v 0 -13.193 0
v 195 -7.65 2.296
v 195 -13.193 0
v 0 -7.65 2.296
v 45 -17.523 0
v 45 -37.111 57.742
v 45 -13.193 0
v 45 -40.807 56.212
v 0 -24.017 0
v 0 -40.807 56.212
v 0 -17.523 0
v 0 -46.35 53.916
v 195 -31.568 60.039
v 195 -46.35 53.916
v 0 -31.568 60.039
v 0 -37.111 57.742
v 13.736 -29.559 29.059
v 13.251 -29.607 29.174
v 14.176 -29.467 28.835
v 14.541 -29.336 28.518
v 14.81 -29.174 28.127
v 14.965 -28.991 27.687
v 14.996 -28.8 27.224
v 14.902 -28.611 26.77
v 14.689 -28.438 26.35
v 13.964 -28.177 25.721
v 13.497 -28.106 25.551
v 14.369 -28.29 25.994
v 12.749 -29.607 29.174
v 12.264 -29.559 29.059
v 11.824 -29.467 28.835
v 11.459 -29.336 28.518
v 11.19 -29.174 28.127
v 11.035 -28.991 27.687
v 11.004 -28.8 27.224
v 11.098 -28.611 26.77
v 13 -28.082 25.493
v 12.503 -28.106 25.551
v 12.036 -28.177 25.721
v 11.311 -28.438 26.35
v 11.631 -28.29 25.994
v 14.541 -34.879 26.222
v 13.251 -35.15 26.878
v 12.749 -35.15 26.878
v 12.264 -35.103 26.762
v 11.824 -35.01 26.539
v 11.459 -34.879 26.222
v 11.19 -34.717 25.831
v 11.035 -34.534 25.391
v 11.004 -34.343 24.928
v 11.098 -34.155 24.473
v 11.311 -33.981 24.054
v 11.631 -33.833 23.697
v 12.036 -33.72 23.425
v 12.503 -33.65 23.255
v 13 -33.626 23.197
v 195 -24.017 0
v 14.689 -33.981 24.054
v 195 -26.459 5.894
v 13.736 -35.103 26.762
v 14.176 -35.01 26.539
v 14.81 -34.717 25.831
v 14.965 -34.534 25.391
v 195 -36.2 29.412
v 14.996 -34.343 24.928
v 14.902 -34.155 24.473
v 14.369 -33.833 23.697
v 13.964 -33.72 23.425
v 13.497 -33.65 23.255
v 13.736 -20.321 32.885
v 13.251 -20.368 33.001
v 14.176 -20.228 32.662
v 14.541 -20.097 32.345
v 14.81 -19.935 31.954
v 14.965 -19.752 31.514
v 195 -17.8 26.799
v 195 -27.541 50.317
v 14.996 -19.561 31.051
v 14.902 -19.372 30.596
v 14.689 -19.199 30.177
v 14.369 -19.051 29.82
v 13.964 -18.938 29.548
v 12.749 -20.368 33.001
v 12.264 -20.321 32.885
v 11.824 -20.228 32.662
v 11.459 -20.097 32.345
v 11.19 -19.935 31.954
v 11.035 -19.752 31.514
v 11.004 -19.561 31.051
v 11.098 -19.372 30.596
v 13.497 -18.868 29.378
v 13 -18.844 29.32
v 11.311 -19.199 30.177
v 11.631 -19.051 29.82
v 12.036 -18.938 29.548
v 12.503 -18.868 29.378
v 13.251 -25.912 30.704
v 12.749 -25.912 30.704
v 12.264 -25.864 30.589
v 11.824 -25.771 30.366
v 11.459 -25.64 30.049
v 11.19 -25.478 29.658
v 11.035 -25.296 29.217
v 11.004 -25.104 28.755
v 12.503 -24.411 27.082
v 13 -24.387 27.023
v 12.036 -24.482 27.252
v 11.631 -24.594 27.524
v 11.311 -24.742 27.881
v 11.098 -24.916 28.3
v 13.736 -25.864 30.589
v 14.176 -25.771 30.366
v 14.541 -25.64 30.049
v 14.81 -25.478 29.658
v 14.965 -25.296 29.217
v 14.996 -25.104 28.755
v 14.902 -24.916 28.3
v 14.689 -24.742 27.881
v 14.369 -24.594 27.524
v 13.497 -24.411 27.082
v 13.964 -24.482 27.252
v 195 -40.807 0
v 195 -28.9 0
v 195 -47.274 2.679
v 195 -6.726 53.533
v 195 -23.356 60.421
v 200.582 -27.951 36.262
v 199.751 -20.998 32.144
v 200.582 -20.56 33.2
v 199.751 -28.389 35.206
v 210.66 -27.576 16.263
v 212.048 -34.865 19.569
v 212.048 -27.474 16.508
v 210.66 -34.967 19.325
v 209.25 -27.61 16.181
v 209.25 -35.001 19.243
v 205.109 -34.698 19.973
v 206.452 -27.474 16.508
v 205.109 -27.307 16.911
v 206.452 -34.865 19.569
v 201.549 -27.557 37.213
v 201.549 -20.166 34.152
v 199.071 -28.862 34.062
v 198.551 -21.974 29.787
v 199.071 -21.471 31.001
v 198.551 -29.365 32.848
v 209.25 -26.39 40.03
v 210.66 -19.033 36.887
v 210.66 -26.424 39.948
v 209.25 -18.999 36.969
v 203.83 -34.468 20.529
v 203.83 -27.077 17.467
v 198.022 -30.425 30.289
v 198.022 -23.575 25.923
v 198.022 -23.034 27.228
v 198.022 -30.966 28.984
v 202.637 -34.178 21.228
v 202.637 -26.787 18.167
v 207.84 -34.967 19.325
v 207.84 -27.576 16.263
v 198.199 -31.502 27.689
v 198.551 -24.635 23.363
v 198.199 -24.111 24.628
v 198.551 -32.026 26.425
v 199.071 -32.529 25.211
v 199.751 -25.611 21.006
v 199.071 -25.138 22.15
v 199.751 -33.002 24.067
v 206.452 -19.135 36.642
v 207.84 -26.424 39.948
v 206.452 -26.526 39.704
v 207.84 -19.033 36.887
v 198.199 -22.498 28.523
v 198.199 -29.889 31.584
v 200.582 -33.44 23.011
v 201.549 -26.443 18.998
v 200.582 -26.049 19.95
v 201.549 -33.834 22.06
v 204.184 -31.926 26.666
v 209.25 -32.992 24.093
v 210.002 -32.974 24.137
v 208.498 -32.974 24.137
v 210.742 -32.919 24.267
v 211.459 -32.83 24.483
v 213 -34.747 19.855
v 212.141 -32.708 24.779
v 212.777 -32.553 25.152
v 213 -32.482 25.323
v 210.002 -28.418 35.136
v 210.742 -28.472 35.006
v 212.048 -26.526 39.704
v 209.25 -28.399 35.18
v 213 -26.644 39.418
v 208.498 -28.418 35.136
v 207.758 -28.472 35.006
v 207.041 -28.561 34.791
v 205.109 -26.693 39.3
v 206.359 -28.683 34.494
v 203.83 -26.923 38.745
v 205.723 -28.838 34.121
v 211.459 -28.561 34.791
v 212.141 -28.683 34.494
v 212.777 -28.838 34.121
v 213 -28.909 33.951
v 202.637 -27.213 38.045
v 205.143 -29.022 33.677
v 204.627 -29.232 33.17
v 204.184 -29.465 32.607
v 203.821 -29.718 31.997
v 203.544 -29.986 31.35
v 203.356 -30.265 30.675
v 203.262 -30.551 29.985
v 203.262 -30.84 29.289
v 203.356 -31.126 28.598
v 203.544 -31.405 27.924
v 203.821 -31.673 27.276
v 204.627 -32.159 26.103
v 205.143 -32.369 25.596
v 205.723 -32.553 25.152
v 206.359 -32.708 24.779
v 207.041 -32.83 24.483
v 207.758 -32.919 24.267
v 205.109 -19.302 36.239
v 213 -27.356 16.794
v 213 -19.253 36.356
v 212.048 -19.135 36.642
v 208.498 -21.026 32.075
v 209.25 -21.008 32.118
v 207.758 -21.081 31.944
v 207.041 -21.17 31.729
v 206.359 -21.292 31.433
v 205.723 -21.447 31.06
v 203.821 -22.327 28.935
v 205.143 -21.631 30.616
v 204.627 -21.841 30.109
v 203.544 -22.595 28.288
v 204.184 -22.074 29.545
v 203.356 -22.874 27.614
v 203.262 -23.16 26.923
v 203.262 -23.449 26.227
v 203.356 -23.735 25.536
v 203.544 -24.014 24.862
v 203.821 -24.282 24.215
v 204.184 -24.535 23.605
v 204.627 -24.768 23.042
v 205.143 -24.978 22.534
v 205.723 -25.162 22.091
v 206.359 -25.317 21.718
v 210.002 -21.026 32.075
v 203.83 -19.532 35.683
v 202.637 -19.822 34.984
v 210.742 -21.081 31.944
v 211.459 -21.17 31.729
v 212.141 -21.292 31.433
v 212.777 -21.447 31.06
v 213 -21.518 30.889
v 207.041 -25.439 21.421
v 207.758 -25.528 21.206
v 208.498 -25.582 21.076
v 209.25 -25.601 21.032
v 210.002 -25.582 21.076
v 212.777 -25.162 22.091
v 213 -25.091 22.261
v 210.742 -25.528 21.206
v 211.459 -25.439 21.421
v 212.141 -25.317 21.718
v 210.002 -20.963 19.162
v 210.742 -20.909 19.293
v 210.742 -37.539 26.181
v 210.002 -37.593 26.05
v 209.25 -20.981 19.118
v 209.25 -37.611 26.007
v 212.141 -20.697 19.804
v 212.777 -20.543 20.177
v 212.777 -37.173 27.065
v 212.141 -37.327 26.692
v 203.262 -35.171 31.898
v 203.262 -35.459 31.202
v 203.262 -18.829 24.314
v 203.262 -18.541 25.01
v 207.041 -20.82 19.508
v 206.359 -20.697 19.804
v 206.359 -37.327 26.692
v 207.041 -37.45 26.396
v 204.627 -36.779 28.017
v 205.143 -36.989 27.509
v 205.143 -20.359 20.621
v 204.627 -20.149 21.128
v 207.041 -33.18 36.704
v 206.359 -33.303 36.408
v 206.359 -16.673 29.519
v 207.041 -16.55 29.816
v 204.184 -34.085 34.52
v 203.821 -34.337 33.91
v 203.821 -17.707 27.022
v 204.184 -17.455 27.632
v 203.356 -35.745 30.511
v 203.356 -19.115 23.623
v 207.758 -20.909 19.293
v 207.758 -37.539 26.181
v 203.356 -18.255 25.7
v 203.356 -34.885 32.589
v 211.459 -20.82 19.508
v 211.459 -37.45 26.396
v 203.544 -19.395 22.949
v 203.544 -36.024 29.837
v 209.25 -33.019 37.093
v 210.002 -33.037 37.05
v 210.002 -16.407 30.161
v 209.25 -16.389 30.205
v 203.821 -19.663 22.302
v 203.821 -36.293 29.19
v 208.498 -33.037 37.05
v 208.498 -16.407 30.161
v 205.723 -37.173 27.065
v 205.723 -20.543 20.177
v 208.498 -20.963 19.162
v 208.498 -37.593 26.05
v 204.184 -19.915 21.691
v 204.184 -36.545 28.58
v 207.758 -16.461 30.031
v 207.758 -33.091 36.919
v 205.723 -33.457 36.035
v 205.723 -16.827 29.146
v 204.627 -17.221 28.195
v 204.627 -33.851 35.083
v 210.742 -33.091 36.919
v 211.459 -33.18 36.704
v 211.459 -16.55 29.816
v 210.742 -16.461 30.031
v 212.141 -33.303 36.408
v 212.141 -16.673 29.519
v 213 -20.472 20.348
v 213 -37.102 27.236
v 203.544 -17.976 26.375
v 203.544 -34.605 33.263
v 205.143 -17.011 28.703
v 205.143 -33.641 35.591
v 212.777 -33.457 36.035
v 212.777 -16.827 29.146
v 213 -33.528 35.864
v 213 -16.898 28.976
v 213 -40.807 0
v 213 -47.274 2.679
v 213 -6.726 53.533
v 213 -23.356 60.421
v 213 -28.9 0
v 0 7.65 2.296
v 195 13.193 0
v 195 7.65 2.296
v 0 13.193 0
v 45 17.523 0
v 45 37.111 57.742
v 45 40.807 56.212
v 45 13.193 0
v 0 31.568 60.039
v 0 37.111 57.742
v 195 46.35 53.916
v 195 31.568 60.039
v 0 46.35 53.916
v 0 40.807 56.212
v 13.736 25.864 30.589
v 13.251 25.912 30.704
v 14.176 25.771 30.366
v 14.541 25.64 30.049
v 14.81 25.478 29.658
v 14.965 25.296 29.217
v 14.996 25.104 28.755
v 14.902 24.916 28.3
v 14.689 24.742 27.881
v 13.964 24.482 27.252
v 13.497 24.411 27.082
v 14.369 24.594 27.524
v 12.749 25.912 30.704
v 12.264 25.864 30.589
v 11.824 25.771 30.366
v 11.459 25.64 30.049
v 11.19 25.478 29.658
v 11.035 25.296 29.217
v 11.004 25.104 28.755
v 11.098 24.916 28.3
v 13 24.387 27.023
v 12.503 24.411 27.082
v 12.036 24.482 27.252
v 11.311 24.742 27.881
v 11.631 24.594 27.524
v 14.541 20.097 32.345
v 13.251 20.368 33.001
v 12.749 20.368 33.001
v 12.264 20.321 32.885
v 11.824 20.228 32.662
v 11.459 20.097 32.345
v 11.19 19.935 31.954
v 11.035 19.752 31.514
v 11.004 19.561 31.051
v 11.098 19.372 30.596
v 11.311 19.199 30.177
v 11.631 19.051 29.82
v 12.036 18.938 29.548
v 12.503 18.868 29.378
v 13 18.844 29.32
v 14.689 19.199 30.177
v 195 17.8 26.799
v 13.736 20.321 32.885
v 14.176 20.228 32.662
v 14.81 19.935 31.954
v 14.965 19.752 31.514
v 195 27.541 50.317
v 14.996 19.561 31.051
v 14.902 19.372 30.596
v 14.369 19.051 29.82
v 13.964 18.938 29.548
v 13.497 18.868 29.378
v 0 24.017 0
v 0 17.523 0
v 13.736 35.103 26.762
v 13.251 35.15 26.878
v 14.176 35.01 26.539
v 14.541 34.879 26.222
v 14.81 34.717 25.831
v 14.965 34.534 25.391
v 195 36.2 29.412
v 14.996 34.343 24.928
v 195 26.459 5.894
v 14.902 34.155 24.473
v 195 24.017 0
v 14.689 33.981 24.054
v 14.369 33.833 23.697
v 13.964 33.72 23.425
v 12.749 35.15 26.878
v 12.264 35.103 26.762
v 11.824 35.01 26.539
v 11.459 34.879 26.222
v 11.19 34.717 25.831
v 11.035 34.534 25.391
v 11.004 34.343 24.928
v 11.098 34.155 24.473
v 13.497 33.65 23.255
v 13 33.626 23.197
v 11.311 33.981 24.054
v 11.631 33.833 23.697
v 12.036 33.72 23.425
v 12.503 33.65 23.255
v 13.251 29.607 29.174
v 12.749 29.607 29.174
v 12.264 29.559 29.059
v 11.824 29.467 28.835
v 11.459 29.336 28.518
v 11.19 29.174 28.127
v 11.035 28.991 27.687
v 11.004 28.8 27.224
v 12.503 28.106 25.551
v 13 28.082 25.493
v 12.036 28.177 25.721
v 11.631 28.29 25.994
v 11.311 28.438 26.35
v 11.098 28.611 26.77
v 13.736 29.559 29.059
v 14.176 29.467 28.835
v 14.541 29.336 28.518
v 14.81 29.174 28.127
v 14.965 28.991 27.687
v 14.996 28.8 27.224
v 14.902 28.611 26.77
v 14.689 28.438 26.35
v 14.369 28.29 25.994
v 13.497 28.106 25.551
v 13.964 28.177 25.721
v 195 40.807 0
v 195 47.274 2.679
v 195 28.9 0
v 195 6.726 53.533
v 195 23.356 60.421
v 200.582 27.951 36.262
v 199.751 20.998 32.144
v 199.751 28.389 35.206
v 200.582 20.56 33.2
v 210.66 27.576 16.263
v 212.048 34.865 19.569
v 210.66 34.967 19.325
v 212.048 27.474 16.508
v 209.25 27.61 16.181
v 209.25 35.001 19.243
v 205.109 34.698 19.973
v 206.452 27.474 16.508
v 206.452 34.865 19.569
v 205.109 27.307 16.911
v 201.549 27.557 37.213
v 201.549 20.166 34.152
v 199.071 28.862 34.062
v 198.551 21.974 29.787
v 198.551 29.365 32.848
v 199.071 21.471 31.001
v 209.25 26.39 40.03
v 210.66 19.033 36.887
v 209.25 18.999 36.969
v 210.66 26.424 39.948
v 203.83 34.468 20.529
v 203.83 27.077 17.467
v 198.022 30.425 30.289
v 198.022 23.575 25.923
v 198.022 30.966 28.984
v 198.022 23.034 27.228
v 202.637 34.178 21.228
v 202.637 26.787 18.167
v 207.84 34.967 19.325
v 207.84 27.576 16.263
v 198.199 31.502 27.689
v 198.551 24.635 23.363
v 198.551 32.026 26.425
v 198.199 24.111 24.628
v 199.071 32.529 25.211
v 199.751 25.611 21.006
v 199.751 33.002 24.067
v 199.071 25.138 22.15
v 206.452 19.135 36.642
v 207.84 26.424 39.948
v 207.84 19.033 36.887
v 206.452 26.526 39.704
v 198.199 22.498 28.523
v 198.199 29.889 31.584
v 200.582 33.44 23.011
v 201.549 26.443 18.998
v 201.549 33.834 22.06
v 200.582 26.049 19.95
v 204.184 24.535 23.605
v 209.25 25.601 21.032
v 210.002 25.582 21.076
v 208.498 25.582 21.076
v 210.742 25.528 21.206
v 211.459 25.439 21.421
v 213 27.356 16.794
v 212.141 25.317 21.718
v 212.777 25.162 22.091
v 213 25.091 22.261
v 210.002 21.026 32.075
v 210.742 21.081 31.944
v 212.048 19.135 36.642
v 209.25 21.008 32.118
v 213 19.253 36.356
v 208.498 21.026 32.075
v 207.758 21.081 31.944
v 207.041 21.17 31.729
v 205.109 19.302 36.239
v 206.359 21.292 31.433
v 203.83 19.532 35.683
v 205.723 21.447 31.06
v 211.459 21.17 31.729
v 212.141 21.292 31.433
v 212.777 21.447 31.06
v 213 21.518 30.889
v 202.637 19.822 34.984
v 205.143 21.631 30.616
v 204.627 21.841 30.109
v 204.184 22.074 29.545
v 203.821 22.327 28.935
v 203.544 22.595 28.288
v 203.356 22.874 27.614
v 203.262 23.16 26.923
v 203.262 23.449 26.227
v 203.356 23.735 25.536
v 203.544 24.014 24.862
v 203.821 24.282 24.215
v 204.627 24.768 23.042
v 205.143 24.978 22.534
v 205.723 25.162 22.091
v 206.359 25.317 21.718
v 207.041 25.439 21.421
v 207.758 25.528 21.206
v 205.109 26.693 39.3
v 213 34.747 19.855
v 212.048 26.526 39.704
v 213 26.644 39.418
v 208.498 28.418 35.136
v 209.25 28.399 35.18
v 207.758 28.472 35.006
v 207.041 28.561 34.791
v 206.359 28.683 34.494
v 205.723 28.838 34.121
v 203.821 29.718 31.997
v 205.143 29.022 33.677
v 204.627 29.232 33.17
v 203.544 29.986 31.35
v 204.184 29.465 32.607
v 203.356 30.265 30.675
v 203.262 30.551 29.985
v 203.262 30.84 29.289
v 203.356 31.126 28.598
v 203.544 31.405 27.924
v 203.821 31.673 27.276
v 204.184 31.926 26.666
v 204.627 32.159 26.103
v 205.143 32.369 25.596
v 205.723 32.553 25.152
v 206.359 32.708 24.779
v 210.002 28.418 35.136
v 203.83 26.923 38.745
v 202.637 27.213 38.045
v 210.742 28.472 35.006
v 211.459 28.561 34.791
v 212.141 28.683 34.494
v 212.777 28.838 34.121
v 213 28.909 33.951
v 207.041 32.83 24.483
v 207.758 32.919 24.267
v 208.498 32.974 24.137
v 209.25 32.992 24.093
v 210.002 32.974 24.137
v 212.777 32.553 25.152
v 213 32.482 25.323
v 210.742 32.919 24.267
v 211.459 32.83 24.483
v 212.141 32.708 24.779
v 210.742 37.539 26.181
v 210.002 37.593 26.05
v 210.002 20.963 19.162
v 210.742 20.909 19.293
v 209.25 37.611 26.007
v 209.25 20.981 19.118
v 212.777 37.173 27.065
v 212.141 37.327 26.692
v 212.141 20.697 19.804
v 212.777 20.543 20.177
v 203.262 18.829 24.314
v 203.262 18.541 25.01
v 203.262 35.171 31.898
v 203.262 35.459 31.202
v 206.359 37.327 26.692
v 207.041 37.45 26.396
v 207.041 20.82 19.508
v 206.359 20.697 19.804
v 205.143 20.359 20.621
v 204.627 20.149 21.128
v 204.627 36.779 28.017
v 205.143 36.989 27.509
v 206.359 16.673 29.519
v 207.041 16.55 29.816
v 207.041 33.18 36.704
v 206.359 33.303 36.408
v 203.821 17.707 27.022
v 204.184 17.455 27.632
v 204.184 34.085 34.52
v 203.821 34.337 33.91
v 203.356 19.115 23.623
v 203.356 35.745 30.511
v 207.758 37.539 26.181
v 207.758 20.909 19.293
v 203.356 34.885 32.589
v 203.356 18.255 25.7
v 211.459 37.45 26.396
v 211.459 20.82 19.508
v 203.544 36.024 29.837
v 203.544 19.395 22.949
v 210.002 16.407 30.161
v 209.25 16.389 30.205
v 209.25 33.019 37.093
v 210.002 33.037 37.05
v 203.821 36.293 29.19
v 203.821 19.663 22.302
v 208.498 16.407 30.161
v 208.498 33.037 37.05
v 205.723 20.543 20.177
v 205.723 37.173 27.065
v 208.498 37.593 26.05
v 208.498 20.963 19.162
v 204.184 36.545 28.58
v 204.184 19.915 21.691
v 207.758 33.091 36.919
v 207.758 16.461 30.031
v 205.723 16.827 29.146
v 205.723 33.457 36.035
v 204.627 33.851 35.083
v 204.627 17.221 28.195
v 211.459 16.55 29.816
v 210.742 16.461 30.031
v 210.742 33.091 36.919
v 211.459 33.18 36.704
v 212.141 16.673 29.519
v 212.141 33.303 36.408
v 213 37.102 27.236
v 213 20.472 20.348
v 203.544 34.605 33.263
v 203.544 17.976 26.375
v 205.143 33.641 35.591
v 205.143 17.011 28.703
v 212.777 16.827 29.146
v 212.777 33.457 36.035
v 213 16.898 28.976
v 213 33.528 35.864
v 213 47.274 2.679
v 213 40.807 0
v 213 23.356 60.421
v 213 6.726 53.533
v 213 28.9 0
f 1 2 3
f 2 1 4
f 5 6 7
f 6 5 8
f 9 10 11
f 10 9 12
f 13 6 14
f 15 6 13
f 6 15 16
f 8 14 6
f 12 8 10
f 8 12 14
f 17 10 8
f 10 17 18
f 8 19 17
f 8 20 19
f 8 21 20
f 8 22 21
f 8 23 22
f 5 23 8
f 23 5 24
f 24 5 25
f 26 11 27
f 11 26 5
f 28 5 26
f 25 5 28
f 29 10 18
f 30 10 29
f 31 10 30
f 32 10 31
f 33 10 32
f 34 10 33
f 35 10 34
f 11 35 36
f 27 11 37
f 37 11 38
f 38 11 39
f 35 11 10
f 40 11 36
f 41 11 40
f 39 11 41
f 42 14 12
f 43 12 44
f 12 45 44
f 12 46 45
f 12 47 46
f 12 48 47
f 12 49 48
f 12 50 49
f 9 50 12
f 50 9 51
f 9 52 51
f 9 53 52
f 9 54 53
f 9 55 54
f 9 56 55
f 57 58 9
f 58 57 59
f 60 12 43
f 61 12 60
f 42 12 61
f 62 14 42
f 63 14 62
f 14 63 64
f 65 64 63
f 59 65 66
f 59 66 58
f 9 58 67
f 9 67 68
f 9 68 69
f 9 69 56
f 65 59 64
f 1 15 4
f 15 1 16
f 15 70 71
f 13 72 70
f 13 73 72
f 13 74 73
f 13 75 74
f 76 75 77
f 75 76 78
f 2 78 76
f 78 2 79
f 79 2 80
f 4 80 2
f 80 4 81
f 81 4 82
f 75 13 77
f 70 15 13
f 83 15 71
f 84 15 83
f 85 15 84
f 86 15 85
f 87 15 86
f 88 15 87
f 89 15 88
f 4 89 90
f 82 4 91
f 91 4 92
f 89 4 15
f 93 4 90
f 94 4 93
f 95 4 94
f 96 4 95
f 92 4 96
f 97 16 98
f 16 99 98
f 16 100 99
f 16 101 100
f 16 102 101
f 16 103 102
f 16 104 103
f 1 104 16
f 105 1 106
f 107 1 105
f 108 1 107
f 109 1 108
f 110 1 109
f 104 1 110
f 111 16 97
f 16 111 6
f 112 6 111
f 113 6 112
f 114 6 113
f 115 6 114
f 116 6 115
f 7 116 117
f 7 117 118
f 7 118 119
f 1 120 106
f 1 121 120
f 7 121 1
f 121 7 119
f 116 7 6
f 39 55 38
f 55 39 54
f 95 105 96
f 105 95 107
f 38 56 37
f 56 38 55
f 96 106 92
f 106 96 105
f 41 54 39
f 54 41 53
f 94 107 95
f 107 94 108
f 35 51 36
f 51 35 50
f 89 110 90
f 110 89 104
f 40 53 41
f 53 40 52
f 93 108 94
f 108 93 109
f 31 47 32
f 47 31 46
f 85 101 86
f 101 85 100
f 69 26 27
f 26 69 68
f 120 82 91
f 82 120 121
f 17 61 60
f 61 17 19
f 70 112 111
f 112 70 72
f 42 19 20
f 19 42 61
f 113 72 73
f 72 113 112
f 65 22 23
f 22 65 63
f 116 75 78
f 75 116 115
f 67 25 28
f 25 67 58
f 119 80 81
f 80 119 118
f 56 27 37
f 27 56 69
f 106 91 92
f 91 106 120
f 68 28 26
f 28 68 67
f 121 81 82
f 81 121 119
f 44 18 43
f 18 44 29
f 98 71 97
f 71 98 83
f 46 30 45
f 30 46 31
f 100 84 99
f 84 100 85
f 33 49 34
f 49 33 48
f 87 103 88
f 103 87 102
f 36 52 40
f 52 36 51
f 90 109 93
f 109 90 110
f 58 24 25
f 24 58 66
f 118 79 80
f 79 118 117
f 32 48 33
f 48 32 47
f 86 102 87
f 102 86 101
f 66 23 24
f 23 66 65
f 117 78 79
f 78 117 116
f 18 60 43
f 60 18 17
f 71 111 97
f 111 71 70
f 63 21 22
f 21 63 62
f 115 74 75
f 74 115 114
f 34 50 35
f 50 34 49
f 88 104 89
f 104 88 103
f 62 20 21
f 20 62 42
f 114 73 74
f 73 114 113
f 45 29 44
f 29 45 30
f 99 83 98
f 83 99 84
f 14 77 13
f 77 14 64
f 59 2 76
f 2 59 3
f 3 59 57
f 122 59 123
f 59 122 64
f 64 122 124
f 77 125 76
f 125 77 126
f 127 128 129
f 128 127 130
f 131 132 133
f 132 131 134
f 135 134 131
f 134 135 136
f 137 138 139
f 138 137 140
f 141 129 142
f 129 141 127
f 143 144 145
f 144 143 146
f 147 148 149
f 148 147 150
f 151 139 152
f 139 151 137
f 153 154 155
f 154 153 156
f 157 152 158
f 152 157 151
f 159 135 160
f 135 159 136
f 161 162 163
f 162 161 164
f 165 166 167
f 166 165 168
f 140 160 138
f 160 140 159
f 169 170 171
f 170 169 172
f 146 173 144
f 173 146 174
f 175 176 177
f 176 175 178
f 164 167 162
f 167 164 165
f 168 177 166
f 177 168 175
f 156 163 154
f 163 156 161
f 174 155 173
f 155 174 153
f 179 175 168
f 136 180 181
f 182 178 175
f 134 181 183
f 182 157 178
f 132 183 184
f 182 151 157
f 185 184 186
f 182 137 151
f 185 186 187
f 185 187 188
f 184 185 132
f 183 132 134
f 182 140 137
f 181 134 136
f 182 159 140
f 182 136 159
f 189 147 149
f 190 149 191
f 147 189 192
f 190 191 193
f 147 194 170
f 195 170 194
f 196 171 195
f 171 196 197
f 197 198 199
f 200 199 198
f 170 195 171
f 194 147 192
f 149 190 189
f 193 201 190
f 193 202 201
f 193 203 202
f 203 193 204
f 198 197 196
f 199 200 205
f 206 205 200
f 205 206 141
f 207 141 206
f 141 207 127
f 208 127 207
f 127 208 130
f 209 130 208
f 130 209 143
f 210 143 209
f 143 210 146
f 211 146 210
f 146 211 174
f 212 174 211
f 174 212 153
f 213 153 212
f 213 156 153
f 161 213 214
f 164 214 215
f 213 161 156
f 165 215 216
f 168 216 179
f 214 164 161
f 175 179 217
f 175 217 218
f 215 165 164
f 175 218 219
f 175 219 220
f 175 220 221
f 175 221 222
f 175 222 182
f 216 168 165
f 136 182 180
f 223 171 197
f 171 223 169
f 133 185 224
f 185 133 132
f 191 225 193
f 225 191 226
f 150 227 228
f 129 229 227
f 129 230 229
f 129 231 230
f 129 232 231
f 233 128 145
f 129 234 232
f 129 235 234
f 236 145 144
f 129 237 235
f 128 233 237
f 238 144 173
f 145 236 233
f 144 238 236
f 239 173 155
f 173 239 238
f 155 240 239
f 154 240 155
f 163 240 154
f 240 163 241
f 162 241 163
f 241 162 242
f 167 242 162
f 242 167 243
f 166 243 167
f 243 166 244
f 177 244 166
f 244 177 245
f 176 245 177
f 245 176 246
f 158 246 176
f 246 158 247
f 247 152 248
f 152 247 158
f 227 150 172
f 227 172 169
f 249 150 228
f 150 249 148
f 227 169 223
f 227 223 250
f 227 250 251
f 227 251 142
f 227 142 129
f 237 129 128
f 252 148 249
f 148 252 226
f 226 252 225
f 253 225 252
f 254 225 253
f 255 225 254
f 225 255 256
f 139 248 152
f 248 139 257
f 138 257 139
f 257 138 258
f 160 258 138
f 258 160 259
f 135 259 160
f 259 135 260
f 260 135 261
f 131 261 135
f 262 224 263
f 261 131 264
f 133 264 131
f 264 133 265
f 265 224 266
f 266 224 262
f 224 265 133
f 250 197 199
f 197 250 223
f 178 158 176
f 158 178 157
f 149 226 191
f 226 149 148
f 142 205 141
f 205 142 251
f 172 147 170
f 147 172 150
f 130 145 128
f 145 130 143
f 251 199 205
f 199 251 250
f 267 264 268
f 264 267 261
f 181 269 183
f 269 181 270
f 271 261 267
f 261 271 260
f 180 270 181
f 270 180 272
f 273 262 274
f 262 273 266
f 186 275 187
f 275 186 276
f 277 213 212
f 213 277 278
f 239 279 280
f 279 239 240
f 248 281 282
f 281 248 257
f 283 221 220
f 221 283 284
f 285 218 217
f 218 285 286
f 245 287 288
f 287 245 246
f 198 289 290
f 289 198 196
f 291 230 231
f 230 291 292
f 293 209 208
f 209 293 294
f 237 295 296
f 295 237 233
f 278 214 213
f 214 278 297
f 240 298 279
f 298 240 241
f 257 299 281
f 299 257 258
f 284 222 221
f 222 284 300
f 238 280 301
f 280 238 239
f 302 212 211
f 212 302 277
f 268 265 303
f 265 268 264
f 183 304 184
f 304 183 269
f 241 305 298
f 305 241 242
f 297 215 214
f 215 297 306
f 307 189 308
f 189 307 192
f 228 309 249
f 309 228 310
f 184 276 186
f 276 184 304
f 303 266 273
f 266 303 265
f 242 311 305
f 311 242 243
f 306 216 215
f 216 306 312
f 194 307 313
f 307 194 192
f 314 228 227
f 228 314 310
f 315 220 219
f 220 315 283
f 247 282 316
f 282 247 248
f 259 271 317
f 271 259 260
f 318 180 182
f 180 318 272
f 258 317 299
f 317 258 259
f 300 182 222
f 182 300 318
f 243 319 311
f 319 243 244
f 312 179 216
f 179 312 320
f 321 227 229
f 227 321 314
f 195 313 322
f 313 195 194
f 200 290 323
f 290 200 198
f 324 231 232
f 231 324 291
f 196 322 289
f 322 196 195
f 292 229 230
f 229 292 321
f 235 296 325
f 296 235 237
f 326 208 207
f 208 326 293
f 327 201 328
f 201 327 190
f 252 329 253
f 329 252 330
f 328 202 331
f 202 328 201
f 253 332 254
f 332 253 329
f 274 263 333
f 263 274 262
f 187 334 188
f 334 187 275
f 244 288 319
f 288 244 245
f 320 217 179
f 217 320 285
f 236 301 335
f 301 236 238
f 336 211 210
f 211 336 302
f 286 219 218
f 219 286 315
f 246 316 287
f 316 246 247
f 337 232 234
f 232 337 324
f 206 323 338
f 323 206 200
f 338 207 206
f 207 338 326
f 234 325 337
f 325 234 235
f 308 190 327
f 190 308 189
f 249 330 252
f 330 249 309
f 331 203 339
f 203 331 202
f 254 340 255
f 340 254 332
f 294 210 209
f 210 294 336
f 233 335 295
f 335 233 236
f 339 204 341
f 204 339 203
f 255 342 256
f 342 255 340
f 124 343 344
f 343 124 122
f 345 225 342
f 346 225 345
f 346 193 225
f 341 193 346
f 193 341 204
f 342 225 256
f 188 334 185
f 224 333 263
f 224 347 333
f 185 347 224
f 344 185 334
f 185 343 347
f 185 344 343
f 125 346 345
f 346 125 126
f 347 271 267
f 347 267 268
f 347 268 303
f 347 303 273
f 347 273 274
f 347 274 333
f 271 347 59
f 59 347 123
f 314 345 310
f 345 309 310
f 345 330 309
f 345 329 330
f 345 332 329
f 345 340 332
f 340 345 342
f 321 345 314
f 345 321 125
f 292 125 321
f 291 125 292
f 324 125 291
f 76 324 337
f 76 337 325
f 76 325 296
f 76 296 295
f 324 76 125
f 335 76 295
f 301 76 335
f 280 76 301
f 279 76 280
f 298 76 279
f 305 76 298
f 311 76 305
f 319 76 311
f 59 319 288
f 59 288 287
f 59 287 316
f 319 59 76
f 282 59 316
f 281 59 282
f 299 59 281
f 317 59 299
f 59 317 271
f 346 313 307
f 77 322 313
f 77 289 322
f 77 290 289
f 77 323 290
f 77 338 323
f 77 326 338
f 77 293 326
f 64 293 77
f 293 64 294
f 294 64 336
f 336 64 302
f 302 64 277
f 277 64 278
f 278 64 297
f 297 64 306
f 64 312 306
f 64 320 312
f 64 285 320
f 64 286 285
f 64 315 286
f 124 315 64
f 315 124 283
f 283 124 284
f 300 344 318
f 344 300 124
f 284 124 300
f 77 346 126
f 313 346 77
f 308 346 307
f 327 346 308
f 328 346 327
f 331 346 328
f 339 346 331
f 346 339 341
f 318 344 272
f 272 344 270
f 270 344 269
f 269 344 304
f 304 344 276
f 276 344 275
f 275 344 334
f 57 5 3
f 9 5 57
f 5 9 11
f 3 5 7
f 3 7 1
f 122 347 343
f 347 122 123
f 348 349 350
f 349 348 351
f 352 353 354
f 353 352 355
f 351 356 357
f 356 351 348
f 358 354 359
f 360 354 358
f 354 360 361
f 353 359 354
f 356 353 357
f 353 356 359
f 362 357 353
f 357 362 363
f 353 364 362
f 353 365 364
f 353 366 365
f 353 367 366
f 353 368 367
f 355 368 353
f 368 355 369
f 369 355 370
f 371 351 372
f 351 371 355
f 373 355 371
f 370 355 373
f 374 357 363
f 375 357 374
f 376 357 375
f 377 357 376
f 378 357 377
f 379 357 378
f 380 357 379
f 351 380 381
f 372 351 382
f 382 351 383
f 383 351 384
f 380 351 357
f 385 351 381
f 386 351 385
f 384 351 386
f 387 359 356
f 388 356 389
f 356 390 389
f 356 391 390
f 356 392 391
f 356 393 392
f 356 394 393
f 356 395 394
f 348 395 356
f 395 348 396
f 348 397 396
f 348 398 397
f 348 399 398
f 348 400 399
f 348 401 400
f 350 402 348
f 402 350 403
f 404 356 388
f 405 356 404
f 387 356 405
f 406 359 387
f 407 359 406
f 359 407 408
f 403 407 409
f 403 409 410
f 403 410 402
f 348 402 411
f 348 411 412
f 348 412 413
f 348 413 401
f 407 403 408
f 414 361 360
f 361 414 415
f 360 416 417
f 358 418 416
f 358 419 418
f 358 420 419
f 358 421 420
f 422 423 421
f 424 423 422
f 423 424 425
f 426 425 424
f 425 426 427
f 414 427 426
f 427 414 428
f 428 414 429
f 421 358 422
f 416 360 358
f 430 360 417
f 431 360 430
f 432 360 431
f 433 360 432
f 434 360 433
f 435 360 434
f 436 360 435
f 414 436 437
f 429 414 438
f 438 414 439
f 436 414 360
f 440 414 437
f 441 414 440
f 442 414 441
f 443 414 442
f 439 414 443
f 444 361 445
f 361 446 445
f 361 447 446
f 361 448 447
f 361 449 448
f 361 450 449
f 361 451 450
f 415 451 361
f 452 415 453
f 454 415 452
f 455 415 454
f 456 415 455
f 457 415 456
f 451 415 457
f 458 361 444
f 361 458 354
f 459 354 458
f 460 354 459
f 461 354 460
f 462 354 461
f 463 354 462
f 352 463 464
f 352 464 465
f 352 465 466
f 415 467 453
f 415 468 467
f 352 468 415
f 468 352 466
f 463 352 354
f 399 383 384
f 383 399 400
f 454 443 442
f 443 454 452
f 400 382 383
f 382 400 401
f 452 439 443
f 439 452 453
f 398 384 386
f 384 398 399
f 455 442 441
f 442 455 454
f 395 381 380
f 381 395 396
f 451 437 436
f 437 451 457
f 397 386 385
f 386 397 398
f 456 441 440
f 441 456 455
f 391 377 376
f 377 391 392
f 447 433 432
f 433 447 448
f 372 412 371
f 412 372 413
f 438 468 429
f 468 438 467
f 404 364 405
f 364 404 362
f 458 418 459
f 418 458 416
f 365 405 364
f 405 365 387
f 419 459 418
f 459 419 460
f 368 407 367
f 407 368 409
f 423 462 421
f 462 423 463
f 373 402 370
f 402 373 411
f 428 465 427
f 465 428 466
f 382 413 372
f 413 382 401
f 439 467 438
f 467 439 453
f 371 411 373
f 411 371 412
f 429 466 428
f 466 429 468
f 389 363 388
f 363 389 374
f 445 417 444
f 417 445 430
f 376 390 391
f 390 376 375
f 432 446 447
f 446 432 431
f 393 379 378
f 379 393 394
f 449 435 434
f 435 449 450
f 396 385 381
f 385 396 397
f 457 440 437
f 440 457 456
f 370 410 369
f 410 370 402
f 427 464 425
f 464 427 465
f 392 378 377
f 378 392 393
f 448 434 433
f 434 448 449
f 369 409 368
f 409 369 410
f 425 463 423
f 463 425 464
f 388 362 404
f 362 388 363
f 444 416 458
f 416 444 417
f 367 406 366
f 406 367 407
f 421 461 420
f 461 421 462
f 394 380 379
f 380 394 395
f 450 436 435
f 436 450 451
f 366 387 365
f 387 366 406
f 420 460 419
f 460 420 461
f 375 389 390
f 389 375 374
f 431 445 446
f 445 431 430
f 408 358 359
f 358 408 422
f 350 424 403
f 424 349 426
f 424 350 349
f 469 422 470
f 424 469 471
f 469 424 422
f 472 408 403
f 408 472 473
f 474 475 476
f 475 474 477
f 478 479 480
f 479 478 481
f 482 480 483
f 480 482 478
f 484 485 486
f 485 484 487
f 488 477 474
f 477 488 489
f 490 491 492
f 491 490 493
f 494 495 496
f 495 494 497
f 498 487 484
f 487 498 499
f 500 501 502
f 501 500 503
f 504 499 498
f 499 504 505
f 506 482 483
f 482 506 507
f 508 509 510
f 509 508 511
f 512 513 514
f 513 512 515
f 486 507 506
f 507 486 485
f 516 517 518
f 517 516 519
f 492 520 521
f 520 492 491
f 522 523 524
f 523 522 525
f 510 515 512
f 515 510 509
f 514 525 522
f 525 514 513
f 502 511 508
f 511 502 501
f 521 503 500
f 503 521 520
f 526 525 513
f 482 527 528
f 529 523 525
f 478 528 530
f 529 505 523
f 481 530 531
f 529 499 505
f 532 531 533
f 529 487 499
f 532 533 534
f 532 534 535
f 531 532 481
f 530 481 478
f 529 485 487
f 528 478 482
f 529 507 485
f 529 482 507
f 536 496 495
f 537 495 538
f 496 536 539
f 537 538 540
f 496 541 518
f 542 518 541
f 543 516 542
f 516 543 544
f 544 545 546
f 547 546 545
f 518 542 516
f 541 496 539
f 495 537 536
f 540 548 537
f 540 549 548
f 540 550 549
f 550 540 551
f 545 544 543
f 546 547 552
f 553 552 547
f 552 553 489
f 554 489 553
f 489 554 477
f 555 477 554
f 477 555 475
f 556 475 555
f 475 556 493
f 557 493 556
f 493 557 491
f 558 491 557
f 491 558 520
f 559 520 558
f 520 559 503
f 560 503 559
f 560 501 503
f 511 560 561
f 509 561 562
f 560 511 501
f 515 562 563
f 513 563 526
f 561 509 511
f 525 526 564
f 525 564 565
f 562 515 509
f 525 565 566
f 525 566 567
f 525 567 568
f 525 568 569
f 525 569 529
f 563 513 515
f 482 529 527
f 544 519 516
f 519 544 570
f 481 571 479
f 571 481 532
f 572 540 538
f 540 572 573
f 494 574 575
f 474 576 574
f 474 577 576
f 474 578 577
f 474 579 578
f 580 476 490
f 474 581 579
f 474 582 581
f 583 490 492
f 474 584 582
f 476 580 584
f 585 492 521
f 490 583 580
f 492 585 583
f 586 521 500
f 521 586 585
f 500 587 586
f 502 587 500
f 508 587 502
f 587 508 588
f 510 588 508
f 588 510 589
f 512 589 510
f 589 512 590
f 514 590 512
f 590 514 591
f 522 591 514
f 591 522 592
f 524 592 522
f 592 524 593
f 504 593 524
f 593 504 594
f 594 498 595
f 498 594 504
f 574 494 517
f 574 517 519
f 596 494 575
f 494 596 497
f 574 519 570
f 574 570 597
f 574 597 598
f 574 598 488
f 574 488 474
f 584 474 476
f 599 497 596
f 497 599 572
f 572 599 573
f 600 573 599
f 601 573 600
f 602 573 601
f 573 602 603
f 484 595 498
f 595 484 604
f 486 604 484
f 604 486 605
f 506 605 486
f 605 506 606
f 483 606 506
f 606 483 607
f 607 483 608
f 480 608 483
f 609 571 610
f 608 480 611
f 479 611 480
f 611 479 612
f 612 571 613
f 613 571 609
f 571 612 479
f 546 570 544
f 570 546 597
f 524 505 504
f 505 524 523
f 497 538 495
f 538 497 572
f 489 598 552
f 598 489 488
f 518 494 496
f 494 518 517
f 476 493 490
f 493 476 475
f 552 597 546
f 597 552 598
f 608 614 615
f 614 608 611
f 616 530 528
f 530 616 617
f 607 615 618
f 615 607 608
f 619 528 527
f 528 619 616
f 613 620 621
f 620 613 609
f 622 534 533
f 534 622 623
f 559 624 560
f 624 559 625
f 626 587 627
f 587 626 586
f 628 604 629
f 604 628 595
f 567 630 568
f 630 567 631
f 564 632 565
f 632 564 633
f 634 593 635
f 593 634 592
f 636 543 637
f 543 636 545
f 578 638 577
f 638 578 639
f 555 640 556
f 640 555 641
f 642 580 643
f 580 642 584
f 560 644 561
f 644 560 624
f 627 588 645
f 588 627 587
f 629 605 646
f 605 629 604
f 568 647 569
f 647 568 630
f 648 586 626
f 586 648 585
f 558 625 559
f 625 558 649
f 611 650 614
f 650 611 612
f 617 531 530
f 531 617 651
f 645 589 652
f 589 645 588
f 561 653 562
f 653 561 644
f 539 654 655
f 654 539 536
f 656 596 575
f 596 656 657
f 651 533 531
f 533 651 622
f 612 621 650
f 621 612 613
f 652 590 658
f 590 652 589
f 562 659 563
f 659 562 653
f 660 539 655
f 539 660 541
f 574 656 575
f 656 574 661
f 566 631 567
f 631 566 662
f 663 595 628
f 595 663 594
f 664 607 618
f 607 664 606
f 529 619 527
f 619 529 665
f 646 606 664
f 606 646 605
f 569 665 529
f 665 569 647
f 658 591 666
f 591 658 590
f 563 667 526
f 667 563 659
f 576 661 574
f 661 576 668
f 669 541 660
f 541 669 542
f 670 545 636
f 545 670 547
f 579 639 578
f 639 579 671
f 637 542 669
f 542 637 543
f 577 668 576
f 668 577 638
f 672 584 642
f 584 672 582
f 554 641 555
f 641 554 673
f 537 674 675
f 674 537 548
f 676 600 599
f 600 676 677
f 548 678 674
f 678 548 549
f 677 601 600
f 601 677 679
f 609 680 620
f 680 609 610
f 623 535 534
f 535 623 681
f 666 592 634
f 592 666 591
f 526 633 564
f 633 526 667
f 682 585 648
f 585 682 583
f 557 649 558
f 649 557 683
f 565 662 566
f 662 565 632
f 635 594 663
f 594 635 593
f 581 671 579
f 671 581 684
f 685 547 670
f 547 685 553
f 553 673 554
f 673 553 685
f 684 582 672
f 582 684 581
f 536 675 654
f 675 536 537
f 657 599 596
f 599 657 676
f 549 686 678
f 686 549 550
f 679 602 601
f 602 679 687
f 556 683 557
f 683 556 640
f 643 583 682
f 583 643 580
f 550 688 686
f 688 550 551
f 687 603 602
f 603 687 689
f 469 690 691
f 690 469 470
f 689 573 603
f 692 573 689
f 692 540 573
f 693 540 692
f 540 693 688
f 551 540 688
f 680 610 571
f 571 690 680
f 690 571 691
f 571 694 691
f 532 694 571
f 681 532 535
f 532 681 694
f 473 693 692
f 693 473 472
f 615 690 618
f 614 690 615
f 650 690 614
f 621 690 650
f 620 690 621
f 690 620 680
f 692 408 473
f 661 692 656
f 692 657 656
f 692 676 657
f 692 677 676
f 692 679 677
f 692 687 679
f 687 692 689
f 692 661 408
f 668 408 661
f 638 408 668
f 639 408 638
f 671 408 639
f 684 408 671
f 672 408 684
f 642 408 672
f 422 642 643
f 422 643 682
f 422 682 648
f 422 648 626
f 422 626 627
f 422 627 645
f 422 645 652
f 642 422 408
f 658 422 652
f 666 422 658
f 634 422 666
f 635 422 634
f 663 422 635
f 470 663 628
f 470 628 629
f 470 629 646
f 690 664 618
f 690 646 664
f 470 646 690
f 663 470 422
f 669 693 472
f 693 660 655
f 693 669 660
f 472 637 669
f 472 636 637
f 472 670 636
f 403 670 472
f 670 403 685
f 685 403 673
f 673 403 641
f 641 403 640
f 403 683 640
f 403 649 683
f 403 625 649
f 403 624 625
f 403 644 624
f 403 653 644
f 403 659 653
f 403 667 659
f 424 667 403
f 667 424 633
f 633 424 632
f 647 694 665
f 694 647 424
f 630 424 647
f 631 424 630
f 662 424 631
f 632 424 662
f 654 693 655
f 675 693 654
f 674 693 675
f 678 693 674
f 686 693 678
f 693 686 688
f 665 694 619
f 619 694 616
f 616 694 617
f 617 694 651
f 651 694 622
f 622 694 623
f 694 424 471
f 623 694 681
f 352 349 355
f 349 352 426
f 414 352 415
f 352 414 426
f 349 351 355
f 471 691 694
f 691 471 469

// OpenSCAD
Bearing608zzThick = 8;
Bearing608zzDiameter = 22.5;
M8ThreadDiameter = 12;
XWallThick = 20;
YWallThick = 5;
ZWallThick = 3;

Z18plateThick = 4;
spoolHeight = 150;
part = "both"; // [left:left only,right:right only,both:left and right]

module bearingSupport(Bearing608zzThick, Bearing608zzDiameter, M8ThreadDiameter, XWallThick, YWallThick, ZWallThick)  {
    difference() {
        translate([-(XWallThick*2+Bearing608zzDiameter)/2, -(YWallThick*2+Bearing608zzThick)/2, 0]) {
            cube([XWallThick*2+Bearing608zzDiameter, YWallThick*2+Bearing608zzThick, ZWallThick + Bearing608zzDiameter*2/3]);
        }
        translate([0,0,ZWallThick+Bearing608zzDiameter/2]) {
            rotate([90,0,0]) {
                cylinder(r=Bearing608zzDiameter/2, h=Bearing608zzThick, $fn=50, center=true);
                cylinder(r=M8ThreadDiameter/2, h=Bearing608zzThick+YWallThick*2+2, $fn=50, center=true);
            }
        }
    }
}


module Z18clip(width, height, thick, Z18plateThick) {
    difference() {
        union() {
            translate([-(width)/2, -thick-Z18plateThick/2, 0]) {
                cube([width,thick,height]);
            }
            translate([-(width)/2, Z18plateThick/2, 0]) {
                cube([width,thick,height]);
            }
        }
        translate([0,-(thick*2+Z18plateThick+2)/2, height-32]) {
            rotate([-90,0,0]) {
                cylinder(h=thick*2+Z18plateThick+2, r=2, $fn=25);
            }
        }
    }

}

/*
 leftOrRight: 1 - left, (-1) - right
*/
module spoolHolder(leftOrRight) {
    difference() {
        translate([0,0,(XWallThick*2+Bearing608zzDiameter)/2*cos(45/2)-Z18plateThick/2*sin(45/2)]) {
            rotate([0,90,0]) {
                rotate([0,0,leftOrRight*45/2]) {
                    Z18clip(XWallThick*2+Bearing608zzDiameter, 45, 6, Z18plateThick);
                    translate([-(XWallThick*2+Bearing608zzDiameter)/2, -(6*2+Z18plateThick)/2, 45]) {
                        cube([XWallThick*2+Bearing608zzDiameter, 6*2+Z18plateThick, spoolHeight]);
                    }
                }
                rotate([0,0,(-leftOrRight)*45/2]) {
                    translate([0,0,45+spoolHeight]) {
                        bearingSupport(Bearing608zzThick, Bearing608zzDiameter, M8ThreadDiameter, XWallThick, YWallThick, ZWallThick);
                    }
                }
            }
        }
        translate([-300,-300,-300]) {
            cube([600,600,300]);
        }
    }
}

if (part == "left") {
    spoolHolder(-1);
} else if (part == "right") {
    spoolHolder(1);
} else if (part == "both") {
    translate([0, -(YWallThick*2+Bearing608zzThick)*1.5, 0]) {
        spoolHolder(1);
    }
    translate([0, +(YWallThick*2+Bearing608zzThick)*1.5, 0]) {
        spoolHolder(-1);
    }
}
